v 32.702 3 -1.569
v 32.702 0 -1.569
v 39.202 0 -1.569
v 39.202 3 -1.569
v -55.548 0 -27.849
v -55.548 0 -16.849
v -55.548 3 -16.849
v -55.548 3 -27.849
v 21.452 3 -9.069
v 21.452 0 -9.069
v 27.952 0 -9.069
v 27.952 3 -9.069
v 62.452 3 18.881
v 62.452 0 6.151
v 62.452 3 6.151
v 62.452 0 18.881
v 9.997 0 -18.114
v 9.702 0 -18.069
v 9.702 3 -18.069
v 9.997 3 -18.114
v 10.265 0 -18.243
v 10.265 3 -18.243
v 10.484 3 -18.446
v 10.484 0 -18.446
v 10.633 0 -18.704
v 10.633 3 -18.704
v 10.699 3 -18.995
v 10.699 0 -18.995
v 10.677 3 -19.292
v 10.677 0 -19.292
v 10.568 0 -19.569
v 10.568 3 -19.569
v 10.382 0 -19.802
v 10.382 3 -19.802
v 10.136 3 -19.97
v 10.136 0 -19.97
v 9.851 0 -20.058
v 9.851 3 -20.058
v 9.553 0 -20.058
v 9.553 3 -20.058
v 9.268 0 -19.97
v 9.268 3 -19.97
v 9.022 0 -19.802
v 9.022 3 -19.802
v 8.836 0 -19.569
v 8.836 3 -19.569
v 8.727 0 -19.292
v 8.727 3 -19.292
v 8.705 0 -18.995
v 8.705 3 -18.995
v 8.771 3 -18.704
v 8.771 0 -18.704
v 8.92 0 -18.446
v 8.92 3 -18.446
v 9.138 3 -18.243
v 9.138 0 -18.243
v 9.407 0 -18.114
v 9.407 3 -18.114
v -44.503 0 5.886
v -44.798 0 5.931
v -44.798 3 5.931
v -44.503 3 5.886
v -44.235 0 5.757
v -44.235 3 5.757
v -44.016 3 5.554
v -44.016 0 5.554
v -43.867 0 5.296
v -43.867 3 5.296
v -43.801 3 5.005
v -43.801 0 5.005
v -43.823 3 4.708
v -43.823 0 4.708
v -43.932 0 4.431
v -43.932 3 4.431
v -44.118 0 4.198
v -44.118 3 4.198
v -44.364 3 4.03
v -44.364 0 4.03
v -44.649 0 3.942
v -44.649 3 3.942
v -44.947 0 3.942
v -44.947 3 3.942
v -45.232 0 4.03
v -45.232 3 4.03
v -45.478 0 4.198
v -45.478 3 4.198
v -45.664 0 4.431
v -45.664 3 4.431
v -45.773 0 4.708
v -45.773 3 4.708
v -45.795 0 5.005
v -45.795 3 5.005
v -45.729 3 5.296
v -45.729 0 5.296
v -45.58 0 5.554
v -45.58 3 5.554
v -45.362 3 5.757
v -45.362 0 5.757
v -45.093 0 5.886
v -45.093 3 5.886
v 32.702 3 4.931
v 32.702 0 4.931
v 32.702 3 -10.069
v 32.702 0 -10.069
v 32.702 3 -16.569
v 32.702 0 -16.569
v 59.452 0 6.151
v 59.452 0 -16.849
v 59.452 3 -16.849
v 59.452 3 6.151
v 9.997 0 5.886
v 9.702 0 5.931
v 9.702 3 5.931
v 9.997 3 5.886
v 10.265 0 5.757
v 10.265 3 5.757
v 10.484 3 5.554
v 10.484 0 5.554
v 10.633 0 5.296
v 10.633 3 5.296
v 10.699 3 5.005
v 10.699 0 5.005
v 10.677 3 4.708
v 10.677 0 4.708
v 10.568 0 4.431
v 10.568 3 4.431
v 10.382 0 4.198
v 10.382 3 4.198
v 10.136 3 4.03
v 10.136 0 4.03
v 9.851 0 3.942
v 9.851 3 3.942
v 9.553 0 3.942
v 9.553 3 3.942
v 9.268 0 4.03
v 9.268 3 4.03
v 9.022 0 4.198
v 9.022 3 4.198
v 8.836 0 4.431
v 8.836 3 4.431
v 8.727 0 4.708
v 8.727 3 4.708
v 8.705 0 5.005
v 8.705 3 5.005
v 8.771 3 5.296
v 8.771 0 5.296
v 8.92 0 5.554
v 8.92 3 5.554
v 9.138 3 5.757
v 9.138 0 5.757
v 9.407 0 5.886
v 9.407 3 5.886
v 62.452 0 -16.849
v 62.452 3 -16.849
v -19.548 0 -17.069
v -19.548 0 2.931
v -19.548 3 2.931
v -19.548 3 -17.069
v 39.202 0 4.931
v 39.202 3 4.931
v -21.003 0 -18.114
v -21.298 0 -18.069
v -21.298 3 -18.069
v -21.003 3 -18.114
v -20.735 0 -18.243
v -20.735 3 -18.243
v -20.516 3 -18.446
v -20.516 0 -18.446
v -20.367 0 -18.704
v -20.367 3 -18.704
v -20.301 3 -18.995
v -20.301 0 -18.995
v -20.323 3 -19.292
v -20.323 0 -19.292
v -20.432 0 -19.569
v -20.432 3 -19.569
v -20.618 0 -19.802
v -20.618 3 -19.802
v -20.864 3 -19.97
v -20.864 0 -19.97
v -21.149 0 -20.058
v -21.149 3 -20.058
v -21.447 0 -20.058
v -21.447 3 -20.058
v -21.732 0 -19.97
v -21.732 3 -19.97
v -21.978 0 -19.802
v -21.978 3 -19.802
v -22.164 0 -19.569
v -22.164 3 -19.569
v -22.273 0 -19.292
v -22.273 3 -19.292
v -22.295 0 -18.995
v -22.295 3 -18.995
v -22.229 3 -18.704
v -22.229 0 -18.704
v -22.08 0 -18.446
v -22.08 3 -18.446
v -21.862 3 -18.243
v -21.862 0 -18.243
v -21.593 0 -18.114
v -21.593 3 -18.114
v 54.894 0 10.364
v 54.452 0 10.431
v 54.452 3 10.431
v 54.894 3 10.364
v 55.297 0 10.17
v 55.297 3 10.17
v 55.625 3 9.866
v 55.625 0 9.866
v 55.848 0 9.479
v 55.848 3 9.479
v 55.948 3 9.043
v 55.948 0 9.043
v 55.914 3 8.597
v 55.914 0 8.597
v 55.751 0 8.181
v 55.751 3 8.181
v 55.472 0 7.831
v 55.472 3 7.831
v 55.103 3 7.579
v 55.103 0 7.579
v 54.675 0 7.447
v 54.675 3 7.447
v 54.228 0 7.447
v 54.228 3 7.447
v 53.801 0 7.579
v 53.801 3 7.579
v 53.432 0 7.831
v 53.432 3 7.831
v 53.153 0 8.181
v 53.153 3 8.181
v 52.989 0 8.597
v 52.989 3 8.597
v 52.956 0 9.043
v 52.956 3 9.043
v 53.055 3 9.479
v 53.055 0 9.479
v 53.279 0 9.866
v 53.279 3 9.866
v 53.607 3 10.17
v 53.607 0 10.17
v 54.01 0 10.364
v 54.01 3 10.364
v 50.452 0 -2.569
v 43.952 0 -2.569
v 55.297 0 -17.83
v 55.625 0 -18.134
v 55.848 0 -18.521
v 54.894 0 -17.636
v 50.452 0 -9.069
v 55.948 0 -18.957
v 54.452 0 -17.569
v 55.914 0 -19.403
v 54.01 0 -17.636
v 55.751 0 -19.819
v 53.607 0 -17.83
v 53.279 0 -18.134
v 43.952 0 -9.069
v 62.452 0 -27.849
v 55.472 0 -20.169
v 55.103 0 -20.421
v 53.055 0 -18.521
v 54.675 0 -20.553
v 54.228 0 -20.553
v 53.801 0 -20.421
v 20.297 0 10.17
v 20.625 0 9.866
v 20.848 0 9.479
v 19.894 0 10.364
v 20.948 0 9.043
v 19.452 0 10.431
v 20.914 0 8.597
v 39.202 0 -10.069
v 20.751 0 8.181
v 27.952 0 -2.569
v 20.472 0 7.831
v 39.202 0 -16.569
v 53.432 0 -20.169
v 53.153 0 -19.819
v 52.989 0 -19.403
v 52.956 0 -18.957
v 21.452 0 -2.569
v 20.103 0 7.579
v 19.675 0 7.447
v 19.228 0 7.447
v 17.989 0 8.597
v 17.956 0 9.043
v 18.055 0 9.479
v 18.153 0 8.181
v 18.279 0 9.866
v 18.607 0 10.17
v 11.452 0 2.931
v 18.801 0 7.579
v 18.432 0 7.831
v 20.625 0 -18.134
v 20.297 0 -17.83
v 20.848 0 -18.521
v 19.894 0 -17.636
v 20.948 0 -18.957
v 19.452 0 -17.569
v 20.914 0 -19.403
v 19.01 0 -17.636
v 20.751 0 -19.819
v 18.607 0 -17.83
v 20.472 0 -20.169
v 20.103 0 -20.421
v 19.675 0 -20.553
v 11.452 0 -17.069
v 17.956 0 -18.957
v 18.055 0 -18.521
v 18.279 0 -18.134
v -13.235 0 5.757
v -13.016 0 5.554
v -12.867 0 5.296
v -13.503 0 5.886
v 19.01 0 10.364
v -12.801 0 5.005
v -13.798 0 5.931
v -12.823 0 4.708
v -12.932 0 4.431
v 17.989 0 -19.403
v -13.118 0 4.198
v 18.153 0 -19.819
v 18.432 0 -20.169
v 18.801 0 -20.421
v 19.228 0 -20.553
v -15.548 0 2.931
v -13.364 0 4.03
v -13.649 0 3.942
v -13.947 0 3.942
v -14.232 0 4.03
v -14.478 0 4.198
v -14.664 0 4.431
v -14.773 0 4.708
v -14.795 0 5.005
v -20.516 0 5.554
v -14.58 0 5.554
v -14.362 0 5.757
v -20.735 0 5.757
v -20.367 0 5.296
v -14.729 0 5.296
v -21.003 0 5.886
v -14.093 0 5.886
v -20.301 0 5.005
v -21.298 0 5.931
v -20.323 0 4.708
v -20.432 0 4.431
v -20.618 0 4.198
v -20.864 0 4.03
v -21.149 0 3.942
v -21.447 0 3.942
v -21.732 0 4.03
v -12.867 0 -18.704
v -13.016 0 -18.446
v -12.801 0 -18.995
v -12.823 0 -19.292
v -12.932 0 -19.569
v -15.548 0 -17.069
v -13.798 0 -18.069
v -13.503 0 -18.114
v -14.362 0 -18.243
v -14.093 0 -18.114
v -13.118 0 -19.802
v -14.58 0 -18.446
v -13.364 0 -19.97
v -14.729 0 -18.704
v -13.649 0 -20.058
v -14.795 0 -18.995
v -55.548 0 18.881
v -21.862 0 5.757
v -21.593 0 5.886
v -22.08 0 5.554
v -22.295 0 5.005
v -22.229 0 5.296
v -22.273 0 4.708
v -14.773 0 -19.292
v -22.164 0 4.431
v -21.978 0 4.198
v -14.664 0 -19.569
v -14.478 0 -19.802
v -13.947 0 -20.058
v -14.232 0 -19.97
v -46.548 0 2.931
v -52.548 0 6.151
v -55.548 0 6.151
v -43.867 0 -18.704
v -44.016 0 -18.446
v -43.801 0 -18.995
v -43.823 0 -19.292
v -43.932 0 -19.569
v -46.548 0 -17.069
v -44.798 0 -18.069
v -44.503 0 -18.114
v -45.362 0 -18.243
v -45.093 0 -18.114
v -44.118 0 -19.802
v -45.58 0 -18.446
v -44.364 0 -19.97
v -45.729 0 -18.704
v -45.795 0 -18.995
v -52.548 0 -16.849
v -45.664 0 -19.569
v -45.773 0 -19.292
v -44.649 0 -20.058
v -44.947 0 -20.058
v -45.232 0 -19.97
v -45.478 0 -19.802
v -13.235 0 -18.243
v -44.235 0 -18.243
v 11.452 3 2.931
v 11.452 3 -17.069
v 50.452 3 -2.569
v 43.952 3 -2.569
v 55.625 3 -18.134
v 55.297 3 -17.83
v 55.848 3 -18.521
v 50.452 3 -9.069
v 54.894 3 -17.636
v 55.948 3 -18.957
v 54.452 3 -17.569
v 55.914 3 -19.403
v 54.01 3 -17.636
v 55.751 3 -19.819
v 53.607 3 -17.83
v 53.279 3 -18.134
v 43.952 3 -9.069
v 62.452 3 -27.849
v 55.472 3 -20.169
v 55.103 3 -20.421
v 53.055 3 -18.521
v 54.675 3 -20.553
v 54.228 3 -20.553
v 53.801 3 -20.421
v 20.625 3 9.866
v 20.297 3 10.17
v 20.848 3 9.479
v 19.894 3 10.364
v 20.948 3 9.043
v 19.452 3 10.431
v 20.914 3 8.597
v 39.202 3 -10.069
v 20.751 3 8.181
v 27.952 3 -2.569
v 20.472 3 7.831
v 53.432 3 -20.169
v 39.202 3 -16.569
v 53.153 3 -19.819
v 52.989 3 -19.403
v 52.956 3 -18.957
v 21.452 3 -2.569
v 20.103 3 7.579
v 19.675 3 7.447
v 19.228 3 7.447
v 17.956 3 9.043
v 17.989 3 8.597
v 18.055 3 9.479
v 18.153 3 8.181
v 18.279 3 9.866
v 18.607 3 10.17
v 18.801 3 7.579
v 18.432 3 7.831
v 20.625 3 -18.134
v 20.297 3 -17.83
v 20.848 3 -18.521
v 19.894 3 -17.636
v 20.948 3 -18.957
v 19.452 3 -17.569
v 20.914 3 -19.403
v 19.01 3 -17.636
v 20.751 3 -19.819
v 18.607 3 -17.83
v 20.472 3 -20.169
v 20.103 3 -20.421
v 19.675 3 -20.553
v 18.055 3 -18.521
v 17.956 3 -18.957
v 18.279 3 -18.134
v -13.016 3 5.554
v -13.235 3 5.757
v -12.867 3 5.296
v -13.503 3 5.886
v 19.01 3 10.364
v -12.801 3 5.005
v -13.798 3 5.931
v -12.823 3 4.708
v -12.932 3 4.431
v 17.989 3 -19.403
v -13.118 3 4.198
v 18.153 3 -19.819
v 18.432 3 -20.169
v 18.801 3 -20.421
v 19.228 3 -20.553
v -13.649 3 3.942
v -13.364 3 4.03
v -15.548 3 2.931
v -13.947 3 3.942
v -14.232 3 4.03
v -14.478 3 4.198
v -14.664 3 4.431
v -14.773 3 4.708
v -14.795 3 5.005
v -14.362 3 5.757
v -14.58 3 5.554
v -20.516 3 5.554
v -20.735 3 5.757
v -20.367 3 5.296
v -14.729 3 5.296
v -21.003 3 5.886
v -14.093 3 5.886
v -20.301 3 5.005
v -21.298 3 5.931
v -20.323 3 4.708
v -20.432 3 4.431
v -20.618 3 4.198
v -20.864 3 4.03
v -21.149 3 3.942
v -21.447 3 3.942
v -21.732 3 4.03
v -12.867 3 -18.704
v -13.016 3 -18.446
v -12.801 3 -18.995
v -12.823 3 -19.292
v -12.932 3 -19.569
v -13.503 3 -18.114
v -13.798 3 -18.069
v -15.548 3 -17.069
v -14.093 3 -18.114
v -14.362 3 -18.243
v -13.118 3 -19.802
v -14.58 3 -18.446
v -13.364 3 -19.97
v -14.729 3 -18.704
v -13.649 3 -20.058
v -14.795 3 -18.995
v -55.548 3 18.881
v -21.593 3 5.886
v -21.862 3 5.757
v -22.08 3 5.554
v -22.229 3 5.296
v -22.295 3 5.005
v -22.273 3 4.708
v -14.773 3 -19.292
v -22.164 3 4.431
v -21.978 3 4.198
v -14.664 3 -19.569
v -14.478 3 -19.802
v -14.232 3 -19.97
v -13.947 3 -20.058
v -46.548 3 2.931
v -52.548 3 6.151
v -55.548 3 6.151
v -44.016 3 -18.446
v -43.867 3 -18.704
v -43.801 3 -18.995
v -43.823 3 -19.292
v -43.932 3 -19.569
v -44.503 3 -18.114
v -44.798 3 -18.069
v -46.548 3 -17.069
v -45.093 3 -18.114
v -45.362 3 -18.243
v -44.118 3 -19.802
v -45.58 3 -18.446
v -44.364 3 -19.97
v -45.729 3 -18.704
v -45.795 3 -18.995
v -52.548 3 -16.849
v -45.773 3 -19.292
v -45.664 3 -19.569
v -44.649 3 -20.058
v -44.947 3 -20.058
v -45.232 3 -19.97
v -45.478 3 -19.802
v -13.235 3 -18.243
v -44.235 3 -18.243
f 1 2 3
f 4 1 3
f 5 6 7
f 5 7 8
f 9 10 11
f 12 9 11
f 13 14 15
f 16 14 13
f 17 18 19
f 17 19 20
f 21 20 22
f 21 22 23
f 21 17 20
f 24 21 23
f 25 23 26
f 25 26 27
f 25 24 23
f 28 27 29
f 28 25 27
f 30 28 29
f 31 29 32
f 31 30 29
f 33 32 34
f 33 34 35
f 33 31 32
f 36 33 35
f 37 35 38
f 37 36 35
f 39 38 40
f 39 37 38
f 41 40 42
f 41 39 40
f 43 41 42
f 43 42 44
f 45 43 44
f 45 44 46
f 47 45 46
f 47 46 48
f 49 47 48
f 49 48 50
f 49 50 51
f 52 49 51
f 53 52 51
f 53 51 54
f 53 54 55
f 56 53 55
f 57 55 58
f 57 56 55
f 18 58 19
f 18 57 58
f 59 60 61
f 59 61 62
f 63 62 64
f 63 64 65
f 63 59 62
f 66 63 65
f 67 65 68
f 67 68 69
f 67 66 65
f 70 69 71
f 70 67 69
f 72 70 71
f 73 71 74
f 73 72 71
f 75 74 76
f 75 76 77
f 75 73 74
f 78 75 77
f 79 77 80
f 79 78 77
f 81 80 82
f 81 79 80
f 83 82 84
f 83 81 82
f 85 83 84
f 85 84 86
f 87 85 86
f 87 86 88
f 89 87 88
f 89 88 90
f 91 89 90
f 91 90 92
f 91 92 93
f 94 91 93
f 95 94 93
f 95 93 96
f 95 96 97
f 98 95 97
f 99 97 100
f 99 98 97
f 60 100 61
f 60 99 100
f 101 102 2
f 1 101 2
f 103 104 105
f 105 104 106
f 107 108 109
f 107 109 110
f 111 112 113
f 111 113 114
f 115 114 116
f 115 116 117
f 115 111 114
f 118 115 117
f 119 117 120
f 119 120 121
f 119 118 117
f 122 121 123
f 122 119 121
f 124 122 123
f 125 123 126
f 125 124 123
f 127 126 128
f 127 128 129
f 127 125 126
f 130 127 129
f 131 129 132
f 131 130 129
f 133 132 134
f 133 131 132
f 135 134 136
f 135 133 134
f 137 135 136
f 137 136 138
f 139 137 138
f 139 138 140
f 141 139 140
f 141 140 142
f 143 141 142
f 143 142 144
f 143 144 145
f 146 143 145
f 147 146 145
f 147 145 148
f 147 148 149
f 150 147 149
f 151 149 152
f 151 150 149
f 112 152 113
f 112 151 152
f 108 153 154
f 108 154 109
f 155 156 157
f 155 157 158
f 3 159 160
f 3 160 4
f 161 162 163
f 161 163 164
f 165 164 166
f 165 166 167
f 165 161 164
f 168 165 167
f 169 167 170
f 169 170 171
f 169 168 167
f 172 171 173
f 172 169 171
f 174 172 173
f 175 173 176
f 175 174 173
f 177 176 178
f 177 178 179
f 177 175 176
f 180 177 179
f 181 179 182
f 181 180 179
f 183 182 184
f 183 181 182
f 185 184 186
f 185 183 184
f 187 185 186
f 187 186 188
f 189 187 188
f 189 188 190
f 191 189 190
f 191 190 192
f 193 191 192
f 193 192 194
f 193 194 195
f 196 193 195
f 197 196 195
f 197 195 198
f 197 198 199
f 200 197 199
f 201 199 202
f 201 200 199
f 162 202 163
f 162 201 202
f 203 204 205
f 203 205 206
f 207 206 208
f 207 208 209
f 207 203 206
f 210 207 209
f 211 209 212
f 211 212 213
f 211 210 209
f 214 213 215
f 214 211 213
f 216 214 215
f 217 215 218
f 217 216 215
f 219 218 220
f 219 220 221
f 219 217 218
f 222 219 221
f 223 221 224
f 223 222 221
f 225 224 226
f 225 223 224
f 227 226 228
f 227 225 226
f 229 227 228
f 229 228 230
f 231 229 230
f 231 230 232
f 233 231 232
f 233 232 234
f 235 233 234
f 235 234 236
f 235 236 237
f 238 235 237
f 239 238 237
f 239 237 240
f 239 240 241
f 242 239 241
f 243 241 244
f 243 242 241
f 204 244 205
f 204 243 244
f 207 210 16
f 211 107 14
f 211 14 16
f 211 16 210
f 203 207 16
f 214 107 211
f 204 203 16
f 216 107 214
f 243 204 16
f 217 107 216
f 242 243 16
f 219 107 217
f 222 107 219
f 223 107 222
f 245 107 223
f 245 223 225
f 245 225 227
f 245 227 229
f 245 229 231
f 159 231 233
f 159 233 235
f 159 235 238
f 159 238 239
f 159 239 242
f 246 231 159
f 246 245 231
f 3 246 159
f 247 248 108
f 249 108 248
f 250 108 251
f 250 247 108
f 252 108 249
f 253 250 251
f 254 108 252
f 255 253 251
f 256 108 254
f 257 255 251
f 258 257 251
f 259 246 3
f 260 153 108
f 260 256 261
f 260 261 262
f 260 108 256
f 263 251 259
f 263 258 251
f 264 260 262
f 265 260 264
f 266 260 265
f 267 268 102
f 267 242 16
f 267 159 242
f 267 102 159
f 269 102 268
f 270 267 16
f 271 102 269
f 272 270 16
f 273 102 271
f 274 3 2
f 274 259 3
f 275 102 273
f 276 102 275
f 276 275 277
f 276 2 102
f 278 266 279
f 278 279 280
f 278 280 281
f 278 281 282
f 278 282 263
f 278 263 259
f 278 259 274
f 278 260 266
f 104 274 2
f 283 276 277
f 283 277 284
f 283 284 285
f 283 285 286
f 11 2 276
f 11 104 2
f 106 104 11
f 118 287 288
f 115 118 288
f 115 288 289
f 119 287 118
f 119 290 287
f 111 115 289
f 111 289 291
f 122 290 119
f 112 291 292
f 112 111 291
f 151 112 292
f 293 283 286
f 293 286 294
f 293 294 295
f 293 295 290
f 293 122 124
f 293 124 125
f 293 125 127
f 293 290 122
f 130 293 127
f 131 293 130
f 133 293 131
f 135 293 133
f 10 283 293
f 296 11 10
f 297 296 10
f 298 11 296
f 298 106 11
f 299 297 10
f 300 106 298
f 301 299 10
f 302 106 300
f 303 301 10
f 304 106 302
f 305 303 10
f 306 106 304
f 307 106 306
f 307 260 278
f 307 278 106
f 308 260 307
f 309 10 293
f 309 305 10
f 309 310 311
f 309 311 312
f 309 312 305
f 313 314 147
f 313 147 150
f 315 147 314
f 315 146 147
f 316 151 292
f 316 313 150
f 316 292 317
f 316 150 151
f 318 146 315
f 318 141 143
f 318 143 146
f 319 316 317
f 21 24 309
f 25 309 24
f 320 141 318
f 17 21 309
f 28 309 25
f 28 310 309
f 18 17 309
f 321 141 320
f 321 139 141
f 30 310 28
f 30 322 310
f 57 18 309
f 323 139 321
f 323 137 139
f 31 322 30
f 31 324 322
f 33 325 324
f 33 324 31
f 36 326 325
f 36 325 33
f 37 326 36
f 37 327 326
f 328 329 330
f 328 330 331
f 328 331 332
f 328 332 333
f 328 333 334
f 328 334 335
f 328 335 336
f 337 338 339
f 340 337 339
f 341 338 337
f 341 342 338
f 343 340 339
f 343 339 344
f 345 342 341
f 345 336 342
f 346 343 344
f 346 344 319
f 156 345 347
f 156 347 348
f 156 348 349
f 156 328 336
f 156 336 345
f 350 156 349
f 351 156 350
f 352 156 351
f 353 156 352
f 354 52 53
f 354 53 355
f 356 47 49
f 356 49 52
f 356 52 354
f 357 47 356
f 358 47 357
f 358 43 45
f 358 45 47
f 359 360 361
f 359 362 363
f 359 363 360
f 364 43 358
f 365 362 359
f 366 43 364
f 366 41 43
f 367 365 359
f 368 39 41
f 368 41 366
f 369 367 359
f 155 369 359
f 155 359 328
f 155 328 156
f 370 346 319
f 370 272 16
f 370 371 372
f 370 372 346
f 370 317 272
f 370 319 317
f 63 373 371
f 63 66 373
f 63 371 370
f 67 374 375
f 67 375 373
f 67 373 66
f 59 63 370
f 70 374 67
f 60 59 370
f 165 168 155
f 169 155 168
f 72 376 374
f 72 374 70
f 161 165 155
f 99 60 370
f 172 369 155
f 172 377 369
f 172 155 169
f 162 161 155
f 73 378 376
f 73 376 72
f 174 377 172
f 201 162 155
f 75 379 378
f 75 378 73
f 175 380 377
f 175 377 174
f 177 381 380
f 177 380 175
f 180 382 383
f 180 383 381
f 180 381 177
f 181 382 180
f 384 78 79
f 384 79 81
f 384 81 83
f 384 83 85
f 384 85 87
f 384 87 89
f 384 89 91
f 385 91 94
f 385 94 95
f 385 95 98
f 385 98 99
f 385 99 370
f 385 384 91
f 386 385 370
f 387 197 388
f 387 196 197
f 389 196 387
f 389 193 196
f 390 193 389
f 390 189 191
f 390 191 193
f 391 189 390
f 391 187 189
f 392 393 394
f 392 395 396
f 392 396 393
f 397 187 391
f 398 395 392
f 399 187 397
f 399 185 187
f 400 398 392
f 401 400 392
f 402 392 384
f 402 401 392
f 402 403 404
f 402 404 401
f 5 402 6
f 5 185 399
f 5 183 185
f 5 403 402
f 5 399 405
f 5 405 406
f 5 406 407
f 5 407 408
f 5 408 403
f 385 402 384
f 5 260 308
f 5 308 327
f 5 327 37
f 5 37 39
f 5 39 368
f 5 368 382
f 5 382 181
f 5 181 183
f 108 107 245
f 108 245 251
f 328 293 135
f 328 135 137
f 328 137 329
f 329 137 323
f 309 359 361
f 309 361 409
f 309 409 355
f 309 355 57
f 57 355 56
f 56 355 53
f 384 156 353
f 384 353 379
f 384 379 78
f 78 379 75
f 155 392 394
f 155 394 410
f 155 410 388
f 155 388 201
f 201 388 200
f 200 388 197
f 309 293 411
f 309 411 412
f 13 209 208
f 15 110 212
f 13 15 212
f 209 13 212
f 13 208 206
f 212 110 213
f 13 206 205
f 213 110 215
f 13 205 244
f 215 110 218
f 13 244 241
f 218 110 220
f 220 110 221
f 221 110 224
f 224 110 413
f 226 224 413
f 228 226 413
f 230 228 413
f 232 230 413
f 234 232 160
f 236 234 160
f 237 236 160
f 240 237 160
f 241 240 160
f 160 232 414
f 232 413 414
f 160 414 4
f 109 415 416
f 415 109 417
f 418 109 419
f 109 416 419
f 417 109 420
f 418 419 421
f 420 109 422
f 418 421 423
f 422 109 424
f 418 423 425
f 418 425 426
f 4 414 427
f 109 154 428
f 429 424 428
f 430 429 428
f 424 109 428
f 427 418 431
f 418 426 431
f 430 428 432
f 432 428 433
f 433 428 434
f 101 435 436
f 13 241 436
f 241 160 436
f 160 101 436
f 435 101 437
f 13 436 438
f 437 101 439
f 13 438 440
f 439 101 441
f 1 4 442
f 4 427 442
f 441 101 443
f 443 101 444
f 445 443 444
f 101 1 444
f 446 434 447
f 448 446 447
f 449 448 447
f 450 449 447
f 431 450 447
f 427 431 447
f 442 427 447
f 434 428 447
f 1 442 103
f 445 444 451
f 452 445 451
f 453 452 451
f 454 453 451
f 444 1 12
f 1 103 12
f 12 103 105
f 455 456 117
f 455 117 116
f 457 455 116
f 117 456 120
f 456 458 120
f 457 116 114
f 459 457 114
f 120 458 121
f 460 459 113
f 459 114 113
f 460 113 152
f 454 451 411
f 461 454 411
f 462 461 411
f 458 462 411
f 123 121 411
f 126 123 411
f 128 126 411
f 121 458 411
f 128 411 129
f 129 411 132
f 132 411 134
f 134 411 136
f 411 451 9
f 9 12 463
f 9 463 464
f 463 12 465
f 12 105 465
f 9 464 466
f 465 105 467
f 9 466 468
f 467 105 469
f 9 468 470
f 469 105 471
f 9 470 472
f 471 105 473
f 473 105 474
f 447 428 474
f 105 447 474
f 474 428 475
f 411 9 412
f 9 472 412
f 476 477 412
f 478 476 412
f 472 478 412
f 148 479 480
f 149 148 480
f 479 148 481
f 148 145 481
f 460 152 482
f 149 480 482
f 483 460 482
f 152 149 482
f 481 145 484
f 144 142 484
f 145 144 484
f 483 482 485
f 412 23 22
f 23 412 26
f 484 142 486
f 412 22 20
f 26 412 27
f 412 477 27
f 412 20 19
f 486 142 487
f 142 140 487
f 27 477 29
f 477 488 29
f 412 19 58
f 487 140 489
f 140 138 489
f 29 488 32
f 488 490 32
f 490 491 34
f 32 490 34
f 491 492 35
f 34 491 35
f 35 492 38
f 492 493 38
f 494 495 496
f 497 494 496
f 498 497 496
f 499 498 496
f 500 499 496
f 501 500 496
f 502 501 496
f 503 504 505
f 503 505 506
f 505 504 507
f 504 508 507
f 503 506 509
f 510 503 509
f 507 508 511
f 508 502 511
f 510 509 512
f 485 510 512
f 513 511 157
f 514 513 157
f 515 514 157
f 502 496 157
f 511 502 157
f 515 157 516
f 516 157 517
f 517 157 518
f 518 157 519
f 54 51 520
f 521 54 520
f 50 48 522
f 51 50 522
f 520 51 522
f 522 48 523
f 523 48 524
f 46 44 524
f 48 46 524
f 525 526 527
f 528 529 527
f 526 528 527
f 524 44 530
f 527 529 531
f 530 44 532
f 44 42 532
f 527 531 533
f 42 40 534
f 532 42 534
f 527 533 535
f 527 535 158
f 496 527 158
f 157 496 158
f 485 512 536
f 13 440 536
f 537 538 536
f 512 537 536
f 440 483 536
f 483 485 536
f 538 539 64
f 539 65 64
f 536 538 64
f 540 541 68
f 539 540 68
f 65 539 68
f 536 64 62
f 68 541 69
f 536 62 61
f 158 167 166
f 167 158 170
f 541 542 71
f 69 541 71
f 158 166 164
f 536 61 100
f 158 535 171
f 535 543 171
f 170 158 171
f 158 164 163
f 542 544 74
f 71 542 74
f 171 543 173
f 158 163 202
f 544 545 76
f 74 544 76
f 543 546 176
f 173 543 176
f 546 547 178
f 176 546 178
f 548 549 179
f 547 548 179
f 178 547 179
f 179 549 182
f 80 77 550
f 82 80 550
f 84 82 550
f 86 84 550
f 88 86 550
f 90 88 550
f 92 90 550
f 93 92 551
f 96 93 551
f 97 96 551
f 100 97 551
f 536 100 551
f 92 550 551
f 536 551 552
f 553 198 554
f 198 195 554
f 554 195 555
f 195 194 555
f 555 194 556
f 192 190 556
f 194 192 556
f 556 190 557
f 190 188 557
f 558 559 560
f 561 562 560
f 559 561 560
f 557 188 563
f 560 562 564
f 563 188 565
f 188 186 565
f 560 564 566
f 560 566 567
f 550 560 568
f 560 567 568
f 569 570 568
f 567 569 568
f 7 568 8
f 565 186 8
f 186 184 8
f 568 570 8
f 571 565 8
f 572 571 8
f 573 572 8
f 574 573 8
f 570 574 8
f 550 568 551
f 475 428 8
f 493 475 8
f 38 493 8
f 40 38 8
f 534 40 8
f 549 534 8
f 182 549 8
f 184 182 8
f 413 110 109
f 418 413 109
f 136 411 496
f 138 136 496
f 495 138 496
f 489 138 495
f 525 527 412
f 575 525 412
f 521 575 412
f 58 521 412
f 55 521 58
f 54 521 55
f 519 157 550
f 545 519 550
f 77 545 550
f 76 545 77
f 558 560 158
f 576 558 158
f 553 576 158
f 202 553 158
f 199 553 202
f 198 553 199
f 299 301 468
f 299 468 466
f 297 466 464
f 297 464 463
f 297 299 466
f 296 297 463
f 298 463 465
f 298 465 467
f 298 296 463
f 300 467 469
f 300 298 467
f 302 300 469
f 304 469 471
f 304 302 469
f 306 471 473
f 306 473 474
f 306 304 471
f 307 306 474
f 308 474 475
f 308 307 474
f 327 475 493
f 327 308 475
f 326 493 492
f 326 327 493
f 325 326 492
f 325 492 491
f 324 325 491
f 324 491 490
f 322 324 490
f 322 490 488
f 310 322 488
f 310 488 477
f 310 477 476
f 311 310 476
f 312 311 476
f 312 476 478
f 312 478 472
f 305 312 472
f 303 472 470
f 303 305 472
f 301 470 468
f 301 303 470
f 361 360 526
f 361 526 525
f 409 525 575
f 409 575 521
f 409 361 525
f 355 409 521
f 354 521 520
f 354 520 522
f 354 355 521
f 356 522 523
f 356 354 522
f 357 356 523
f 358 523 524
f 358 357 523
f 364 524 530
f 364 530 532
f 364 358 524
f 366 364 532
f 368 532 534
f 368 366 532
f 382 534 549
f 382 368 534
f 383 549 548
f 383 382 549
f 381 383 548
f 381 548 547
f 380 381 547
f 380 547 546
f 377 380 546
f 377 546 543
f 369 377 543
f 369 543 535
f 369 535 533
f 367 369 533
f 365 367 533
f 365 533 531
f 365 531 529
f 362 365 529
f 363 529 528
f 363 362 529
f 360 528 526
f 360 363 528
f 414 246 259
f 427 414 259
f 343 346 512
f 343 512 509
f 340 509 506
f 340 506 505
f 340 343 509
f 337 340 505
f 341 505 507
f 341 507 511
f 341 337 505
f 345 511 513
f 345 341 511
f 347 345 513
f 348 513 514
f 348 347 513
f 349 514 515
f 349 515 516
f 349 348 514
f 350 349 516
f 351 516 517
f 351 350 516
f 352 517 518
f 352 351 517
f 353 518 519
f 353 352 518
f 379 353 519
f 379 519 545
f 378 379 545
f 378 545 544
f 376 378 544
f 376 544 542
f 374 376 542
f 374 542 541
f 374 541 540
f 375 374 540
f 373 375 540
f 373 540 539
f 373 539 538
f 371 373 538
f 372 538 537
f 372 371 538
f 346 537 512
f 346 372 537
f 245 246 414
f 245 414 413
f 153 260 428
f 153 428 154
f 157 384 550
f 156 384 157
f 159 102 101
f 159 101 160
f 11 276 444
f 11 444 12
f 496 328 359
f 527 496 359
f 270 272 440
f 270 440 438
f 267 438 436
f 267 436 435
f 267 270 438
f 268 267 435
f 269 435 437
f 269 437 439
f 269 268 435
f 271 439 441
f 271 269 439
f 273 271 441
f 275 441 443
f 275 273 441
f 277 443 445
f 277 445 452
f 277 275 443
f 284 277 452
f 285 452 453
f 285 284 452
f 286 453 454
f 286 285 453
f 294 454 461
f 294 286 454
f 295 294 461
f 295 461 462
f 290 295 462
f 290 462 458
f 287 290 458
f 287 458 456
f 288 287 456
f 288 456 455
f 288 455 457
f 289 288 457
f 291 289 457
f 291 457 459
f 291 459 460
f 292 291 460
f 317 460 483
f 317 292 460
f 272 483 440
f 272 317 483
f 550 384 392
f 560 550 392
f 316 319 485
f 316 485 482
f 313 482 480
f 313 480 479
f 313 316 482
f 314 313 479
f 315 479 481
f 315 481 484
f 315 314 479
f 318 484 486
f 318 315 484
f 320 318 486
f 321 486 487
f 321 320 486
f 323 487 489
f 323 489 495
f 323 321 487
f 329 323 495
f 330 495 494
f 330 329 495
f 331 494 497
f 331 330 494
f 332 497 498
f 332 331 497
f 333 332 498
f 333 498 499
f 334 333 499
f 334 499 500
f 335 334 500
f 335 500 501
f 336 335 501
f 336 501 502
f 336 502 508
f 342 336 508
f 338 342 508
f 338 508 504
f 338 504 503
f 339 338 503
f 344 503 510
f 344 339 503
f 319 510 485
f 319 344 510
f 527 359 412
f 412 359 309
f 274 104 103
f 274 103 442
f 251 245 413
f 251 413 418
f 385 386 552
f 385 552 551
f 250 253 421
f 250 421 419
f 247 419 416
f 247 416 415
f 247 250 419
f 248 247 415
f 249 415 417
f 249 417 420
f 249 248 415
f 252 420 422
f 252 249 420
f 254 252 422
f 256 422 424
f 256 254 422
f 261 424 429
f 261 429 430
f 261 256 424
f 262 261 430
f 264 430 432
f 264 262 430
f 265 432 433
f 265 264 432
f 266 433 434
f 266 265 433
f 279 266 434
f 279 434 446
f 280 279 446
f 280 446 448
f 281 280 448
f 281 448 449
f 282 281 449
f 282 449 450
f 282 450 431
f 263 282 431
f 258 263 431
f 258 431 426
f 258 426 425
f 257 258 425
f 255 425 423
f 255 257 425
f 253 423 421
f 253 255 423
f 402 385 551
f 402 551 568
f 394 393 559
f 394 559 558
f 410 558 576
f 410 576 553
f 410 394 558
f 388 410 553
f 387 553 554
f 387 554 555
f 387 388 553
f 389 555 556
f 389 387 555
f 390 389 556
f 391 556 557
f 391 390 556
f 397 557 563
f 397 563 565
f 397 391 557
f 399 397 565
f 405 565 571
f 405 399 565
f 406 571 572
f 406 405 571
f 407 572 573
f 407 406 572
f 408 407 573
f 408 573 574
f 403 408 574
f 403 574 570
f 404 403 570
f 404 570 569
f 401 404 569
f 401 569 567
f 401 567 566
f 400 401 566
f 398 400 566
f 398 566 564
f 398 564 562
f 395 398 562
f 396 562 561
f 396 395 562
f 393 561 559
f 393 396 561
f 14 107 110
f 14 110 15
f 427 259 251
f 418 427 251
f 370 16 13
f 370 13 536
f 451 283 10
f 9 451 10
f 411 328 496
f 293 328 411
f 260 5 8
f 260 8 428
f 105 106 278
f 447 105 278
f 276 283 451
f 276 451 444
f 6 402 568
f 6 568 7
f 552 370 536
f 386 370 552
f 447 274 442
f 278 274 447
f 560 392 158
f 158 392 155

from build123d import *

# Parameters (mm, degrees)
SKETCH1_R           = 1.5
SKETCH1_R_2         = 1
SKETCH1_W           = 27
SKETCH1_H           = 20
SKETCH1_W_2         = 6.5
SKETCH1_H_2         = 6.5
BOSS_EXTRUDE1_DEPTH = 3


with BuildPart() as part:
    # Sketch1 → Boss-Extrude1 (new body)
    with BuildSketch(Plane(origin=(0, 0, 0), x_dir=(1, 0, 0), z_dir=(0, 1, 0))):
        Polygon((-55.548227769, -6.151360111), (-52.548227769, -6.151360111), (-52.548227769, 16.848639889), (-55.548227769, 16.848639889), (-55.548227769, 27.848639889), (62.451772231, 27.848639889), (62.451772231, 16.848639889), (59.451772231, 16.848639889), (59.451772231, -6.151360111), (62.451772231, -6.151360111), (62.451772231, -18.881360111), (-55.548227769, -18.881360111), align=None)
        with Locations(Location((19.451772231, 19.069293812, 0), (0, 0, 270))):
            Circle(SKETCH1_R, mode=Mode.SUBTRACT)
        with Locations(Location((54.451772231, 19.069293812, 0), (0, 0, 270))):
            Circle(SKETCH1_R, mode=Mode.SUBTRACT)
        with Locations(Location((54.451772231, -8.930706188, 0), (0, 0, 270))):
            Circle(SKETCH1_R, mode=Mode.SUBTRACT)
        with Locations(Location((19.451772231, -8.930706188, 0), (0, 0, 270))):
            Circle(SKETCH1_R, mode=Mode.SUBTRACT)
        with Locations(Location((9.701772231, 19.069293812, 0), (0, 0, 270))):
            Circle(SKETCH1_R_2, mode=Mode.SUBTRACT)
        with Locations(Location((9.701772231, -4.930706188, 0), (0, 0, 270))):
            Circle(SKETCH1_R_2, mode=Mode.SUBTRACT)
        with Locations(Location((-13.798227769, -4.930706188, 0), (0, 0, 270))):
            Circle(SKETCH1_R_2, mode=Mode.SUBTRACT)
        with Locations(Location((-13.798227769, 19.069293812, 0), (0, 0, 270))):
            Circle(SKETCH1_R_2, mode=Mode.SUBTRACT)
        with Locations(Location((-44.798227769, 19.069293812, 0), (0, 0, 270))):
            Circle(SKETCH1_R_2, mode=Mode.SUBTRACT)
        with Locations(Location((-21.298227769, 19.069293812, 0), (0, 0, 270))):
            Circle(SKETCH1_R_2, mode=Mode.SUBTRACT)
        with Locations(Location((-44.798227769, -4.930706188, 0), (0, 0, 270))):
            Circle(SKETCH1_R_2, mode=Mode.SUBTRACT)
        with Locations(Location((-21.298227769, -4.930706188, 0), (0, 0, 270))):
            Circle(SKETCH1_R_2, mode=Mode.SUBTRACT)
        with Locations((-2.048227769, 7.069293812)):
            Rectangle(SKETCH1_W, SKETCH1_H, mode=Mode.SUBTRACT)
        with Locations((-33.048227769, 7.069293812)):
            Rectangle(SKETCH1_W, SKETCH1_H, mode=Mode.SUBTRACT)
        with Locations((35.951772231, 13.319293812)):
            Rectangle(SKETCH1_W_2, SKETCH1_H_2, mode=Mode.SUBTRACT)
        with Locations((47.201772231, 5.819293812)):
            Rectangle(SKETCH1_W_2, SKETCH1_H_2, mode=Mode.SUBTRACT)
        with Locations((35.951772231, -1.680706188)):
            Rectangle(SKETCH1_W_2, SKETCH1_H_2, mode=Mode.SUBTRACT)
        with Locations((24.701772231, 5.819293812)):
            Rectangle(SKETCH1_W_2, SKETCH1_H_2, mode=Mode.SUBTRACT)
    extrude(amount=BOSS_EXTRUDE1_DEPTH)


solid = part.part
